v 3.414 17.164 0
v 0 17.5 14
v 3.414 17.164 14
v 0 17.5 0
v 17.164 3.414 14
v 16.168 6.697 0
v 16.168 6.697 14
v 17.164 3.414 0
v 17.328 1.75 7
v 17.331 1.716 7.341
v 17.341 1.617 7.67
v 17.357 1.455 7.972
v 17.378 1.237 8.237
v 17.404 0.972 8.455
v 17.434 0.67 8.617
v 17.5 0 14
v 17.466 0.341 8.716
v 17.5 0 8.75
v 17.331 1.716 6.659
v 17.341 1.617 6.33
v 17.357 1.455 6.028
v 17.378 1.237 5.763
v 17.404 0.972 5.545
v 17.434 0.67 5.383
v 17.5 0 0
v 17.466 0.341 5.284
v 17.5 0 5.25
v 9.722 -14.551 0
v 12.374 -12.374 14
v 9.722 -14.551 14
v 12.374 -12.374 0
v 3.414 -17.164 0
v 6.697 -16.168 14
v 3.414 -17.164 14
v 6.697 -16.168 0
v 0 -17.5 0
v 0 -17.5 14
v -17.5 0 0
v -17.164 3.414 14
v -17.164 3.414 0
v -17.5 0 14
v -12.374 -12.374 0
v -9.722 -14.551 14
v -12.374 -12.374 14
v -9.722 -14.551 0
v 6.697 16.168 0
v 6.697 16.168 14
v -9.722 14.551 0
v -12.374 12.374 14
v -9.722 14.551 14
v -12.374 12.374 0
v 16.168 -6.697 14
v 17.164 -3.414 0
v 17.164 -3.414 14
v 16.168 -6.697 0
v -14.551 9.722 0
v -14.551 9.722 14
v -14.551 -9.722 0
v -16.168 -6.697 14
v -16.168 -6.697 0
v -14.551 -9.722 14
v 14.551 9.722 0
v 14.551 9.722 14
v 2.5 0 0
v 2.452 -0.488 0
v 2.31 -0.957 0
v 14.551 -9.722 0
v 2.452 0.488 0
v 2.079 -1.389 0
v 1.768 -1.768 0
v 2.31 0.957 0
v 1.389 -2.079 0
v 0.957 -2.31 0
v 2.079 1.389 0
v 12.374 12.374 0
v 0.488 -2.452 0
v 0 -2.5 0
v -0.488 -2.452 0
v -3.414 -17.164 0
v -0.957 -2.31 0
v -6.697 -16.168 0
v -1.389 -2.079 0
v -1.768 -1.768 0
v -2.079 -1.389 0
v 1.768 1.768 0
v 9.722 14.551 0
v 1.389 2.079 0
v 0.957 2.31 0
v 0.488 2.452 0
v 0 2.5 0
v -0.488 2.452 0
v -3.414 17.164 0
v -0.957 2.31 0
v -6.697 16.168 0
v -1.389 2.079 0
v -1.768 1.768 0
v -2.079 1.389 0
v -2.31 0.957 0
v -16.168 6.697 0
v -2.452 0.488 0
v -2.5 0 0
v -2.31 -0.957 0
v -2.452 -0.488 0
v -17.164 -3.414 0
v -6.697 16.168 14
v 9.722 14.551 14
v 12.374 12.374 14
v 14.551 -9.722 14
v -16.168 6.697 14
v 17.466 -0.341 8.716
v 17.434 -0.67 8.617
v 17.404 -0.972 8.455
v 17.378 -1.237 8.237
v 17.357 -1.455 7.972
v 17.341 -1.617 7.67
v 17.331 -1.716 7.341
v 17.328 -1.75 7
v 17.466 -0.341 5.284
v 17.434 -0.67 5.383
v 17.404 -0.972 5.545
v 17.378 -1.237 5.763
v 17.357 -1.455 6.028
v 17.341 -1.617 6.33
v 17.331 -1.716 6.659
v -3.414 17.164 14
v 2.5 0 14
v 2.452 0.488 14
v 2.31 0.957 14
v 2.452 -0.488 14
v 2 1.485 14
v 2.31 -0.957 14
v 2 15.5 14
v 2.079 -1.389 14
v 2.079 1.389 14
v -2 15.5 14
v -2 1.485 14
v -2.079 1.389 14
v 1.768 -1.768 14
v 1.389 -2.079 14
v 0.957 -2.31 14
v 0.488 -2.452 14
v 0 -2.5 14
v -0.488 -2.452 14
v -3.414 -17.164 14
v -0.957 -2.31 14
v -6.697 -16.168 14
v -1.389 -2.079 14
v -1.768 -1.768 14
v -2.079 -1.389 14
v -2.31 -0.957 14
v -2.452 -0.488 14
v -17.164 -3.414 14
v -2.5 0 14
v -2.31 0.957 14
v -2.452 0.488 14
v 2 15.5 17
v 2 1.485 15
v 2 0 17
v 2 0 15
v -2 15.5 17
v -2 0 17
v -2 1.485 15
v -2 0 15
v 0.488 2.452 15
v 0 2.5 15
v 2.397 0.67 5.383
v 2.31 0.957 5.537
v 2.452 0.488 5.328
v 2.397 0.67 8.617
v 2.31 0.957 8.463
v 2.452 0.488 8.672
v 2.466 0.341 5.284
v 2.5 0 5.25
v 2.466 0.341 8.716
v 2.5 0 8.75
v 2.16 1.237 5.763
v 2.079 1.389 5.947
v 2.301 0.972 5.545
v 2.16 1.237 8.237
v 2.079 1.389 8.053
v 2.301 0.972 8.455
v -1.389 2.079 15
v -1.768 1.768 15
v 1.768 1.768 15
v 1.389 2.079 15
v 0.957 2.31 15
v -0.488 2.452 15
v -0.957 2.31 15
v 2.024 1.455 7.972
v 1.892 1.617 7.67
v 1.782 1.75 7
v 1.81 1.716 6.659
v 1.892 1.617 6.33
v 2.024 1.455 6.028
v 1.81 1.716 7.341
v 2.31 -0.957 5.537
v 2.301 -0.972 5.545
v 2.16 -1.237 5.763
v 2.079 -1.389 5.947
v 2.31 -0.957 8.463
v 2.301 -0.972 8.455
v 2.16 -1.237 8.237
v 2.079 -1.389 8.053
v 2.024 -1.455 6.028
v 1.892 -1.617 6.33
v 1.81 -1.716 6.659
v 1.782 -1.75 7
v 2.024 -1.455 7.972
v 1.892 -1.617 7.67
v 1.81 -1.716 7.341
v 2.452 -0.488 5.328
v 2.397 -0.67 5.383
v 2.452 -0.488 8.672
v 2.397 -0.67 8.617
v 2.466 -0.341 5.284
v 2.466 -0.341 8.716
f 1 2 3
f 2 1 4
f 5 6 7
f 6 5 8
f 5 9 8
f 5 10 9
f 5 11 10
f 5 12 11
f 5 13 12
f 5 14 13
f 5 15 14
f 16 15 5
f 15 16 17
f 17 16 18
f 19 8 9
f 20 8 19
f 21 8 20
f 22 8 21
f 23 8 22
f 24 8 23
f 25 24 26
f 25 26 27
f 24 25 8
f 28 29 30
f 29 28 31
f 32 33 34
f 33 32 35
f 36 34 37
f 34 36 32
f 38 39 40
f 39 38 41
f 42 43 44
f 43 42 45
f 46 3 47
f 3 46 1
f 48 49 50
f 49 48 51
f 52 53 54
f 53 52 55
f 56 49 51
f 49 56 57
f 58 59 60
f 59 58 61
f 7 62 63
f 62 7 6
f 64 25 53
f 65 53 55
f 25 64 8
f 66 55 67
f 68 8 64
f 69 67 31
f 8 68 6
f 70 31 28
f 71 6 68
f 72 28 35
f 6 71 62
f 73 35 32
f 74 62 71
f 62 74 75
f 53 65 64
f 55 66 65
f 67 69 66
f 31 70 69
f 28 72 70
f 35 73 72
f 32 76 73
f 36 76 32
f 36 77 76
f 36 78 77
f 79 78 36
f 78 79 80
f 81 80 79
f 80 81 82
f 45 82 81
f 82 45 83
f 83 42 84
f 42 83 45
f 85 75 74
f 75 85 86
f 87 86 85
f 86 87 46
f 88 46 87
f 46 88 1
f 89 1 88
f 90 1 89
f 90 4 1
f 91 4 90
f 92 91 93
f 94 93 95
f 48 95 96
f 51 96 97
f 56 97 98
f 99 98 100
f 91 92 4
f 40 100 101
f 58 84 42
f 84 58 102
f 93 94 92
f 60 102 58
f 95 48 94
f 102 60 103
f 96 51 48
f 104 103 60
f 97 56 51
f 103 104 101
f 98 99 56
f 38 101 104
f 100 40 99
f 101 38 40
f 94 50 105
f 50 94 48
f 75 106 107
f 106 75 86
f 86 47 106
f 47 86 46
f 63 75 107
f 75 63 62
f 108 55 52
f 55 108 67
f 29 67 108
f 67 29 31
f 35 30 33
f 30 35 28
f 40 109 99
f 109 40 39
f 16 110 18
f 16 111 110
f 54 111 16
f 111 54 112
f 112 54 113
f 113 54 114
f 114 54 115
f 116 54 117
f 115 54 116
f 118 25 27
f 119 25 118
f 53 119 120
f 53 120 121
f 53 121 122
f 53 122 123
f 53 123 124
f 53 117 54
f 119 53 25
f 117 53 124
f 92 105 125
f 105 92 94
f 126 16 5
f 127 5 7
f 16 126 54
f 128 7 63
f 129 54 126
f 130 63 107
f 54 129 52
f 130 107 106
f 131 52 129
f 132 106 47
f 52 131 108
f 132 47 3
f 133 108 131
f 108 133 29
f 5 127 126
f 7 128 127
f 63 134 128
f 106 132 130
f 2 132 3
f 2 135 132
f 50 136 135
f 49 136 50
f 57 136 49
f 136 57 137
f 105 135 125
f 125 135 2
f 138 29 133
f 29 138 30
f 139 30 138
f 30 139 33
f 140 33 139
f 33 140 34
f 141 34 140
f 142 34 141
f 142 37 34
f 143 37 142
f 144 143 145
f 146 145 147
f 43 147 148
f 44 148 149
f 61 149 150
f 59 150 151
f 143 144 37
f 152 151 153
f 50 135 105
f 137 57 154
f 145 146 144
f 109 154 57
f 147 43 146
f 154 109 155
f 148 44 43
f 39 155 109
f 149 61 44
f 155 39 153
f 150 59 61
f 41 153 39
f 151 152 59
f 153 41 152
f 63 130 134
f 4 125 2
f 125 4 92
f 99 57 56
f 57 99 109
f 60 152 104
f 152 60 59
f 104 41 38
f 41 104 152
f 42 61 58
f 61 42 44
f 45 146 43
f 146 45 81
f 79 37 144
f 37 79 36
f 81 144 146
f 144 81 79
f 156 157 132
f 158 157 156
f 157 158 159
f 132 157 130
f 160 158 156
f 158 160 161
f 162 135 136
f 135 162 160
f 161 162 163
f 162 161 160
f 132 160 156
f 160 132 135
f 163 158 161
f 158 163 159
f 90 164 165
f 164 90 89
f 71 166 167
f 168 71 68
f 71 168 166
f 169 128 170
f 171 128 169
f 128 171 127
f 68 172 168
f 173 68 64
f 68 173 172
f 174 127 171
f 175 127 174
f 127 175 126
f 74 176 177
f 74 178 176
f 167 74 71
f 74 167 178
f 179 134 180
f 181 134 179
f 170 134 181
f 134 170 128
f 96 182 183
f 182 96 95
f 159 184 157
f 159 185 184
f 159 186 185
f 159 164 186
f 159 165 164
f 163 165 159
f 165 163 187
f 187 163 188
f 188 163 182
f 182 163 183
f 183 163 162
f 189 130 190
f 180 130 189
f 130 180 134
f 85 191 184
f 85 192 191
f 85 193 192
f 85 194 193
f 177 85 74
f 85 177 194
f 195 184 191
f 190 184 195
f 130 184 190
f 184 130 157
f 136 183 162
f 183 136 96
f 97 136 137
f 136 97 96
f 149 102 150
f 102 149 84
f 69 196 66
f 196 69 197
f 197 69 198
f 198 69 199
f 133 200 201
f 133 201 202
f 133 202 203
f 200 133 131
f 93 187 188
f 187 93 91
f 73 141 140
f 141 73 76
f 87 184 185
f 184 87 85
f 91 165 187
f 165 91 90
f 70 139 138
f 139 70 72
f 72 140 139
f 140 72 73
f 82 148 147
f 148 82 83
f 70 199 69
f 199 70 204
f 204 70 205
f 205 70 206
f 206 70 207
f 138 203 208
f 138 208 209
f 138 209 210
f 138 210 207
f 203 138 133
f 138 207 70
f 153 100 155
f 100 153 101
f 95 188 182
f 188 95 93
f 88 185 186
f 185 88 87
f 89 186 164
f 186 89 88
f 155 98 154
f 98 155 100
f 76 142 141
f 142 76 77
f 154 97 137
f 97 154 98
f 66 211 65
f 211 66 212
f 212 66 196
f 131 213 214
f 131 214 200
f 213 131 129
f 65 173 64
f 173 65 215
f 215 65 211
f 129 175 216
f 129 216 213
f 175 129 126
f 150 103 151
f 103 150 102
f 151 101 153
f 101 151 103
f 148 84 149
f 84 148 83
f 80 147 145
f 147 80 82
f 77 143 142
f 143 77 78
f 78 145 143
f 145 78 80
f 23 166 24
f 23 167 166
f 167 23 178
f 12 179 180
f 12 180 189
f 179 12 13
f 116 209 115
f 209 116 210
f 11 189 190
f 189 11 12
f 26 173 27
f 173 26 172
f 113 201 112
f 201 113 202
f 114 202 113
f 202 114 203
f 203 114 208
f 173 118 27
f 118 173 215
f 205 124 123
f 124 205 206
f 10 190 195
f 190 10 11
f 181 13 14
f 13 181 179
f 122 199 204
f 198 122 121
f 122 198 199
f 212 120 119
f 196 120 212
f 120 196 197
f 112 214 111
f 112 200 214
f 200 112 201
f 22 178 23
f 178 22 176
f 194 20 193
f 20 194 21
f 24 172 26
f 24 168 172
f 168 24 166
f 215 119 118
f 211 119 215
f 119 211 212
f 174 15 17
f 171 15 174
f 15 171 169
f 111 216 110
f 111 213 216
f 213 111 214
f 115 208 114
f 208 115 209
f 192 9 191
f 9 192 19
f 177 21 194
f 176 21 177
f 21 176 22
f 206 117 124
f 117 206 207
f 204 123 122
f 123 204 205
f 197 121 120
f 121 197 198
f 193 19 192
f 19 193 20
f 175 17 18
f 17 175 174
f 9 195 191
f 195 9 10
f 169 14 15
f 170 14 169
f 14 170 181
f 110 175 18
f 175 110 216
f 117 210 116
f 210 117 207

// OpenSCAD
$fn = 32;

// ----------------------------------------------------------------------
// Control knob: pointer knob
// ----------------------------------------------------------------------

// --- parameters (mm) ---
rib_w = 4;                // pointer rib width
rib_h = 4;                // pointer rib height
knob_d = 35;              // knob body diameter
knob_h = 14;              // knob body height
bore_d = 5;               // shaft bore diameter
set_d = 3.5;              // set screw bore diameter

rib_poke = rib_h - 1;  // rib height above the top
total_h = knob_h + rib_h - 1;  // overall height

difference() {
  union() {
    cylinder(h = knob_h, d = knob_d);
    translate([-rib_w / 2, 0, knob_h - 1])
      cube([rib_w, knob_d / 2 - 2, rib_h]);
  }
  translate([0, 0, -1]) cylinder(h = knob_h + 2, d = bore_d);
  translate([-1, 0, knob_h / 2]) rotate([0, 90, 0])
    cylinder(h = knob_d / 2 + bore_d / 2 + 2, d = set_d);}
